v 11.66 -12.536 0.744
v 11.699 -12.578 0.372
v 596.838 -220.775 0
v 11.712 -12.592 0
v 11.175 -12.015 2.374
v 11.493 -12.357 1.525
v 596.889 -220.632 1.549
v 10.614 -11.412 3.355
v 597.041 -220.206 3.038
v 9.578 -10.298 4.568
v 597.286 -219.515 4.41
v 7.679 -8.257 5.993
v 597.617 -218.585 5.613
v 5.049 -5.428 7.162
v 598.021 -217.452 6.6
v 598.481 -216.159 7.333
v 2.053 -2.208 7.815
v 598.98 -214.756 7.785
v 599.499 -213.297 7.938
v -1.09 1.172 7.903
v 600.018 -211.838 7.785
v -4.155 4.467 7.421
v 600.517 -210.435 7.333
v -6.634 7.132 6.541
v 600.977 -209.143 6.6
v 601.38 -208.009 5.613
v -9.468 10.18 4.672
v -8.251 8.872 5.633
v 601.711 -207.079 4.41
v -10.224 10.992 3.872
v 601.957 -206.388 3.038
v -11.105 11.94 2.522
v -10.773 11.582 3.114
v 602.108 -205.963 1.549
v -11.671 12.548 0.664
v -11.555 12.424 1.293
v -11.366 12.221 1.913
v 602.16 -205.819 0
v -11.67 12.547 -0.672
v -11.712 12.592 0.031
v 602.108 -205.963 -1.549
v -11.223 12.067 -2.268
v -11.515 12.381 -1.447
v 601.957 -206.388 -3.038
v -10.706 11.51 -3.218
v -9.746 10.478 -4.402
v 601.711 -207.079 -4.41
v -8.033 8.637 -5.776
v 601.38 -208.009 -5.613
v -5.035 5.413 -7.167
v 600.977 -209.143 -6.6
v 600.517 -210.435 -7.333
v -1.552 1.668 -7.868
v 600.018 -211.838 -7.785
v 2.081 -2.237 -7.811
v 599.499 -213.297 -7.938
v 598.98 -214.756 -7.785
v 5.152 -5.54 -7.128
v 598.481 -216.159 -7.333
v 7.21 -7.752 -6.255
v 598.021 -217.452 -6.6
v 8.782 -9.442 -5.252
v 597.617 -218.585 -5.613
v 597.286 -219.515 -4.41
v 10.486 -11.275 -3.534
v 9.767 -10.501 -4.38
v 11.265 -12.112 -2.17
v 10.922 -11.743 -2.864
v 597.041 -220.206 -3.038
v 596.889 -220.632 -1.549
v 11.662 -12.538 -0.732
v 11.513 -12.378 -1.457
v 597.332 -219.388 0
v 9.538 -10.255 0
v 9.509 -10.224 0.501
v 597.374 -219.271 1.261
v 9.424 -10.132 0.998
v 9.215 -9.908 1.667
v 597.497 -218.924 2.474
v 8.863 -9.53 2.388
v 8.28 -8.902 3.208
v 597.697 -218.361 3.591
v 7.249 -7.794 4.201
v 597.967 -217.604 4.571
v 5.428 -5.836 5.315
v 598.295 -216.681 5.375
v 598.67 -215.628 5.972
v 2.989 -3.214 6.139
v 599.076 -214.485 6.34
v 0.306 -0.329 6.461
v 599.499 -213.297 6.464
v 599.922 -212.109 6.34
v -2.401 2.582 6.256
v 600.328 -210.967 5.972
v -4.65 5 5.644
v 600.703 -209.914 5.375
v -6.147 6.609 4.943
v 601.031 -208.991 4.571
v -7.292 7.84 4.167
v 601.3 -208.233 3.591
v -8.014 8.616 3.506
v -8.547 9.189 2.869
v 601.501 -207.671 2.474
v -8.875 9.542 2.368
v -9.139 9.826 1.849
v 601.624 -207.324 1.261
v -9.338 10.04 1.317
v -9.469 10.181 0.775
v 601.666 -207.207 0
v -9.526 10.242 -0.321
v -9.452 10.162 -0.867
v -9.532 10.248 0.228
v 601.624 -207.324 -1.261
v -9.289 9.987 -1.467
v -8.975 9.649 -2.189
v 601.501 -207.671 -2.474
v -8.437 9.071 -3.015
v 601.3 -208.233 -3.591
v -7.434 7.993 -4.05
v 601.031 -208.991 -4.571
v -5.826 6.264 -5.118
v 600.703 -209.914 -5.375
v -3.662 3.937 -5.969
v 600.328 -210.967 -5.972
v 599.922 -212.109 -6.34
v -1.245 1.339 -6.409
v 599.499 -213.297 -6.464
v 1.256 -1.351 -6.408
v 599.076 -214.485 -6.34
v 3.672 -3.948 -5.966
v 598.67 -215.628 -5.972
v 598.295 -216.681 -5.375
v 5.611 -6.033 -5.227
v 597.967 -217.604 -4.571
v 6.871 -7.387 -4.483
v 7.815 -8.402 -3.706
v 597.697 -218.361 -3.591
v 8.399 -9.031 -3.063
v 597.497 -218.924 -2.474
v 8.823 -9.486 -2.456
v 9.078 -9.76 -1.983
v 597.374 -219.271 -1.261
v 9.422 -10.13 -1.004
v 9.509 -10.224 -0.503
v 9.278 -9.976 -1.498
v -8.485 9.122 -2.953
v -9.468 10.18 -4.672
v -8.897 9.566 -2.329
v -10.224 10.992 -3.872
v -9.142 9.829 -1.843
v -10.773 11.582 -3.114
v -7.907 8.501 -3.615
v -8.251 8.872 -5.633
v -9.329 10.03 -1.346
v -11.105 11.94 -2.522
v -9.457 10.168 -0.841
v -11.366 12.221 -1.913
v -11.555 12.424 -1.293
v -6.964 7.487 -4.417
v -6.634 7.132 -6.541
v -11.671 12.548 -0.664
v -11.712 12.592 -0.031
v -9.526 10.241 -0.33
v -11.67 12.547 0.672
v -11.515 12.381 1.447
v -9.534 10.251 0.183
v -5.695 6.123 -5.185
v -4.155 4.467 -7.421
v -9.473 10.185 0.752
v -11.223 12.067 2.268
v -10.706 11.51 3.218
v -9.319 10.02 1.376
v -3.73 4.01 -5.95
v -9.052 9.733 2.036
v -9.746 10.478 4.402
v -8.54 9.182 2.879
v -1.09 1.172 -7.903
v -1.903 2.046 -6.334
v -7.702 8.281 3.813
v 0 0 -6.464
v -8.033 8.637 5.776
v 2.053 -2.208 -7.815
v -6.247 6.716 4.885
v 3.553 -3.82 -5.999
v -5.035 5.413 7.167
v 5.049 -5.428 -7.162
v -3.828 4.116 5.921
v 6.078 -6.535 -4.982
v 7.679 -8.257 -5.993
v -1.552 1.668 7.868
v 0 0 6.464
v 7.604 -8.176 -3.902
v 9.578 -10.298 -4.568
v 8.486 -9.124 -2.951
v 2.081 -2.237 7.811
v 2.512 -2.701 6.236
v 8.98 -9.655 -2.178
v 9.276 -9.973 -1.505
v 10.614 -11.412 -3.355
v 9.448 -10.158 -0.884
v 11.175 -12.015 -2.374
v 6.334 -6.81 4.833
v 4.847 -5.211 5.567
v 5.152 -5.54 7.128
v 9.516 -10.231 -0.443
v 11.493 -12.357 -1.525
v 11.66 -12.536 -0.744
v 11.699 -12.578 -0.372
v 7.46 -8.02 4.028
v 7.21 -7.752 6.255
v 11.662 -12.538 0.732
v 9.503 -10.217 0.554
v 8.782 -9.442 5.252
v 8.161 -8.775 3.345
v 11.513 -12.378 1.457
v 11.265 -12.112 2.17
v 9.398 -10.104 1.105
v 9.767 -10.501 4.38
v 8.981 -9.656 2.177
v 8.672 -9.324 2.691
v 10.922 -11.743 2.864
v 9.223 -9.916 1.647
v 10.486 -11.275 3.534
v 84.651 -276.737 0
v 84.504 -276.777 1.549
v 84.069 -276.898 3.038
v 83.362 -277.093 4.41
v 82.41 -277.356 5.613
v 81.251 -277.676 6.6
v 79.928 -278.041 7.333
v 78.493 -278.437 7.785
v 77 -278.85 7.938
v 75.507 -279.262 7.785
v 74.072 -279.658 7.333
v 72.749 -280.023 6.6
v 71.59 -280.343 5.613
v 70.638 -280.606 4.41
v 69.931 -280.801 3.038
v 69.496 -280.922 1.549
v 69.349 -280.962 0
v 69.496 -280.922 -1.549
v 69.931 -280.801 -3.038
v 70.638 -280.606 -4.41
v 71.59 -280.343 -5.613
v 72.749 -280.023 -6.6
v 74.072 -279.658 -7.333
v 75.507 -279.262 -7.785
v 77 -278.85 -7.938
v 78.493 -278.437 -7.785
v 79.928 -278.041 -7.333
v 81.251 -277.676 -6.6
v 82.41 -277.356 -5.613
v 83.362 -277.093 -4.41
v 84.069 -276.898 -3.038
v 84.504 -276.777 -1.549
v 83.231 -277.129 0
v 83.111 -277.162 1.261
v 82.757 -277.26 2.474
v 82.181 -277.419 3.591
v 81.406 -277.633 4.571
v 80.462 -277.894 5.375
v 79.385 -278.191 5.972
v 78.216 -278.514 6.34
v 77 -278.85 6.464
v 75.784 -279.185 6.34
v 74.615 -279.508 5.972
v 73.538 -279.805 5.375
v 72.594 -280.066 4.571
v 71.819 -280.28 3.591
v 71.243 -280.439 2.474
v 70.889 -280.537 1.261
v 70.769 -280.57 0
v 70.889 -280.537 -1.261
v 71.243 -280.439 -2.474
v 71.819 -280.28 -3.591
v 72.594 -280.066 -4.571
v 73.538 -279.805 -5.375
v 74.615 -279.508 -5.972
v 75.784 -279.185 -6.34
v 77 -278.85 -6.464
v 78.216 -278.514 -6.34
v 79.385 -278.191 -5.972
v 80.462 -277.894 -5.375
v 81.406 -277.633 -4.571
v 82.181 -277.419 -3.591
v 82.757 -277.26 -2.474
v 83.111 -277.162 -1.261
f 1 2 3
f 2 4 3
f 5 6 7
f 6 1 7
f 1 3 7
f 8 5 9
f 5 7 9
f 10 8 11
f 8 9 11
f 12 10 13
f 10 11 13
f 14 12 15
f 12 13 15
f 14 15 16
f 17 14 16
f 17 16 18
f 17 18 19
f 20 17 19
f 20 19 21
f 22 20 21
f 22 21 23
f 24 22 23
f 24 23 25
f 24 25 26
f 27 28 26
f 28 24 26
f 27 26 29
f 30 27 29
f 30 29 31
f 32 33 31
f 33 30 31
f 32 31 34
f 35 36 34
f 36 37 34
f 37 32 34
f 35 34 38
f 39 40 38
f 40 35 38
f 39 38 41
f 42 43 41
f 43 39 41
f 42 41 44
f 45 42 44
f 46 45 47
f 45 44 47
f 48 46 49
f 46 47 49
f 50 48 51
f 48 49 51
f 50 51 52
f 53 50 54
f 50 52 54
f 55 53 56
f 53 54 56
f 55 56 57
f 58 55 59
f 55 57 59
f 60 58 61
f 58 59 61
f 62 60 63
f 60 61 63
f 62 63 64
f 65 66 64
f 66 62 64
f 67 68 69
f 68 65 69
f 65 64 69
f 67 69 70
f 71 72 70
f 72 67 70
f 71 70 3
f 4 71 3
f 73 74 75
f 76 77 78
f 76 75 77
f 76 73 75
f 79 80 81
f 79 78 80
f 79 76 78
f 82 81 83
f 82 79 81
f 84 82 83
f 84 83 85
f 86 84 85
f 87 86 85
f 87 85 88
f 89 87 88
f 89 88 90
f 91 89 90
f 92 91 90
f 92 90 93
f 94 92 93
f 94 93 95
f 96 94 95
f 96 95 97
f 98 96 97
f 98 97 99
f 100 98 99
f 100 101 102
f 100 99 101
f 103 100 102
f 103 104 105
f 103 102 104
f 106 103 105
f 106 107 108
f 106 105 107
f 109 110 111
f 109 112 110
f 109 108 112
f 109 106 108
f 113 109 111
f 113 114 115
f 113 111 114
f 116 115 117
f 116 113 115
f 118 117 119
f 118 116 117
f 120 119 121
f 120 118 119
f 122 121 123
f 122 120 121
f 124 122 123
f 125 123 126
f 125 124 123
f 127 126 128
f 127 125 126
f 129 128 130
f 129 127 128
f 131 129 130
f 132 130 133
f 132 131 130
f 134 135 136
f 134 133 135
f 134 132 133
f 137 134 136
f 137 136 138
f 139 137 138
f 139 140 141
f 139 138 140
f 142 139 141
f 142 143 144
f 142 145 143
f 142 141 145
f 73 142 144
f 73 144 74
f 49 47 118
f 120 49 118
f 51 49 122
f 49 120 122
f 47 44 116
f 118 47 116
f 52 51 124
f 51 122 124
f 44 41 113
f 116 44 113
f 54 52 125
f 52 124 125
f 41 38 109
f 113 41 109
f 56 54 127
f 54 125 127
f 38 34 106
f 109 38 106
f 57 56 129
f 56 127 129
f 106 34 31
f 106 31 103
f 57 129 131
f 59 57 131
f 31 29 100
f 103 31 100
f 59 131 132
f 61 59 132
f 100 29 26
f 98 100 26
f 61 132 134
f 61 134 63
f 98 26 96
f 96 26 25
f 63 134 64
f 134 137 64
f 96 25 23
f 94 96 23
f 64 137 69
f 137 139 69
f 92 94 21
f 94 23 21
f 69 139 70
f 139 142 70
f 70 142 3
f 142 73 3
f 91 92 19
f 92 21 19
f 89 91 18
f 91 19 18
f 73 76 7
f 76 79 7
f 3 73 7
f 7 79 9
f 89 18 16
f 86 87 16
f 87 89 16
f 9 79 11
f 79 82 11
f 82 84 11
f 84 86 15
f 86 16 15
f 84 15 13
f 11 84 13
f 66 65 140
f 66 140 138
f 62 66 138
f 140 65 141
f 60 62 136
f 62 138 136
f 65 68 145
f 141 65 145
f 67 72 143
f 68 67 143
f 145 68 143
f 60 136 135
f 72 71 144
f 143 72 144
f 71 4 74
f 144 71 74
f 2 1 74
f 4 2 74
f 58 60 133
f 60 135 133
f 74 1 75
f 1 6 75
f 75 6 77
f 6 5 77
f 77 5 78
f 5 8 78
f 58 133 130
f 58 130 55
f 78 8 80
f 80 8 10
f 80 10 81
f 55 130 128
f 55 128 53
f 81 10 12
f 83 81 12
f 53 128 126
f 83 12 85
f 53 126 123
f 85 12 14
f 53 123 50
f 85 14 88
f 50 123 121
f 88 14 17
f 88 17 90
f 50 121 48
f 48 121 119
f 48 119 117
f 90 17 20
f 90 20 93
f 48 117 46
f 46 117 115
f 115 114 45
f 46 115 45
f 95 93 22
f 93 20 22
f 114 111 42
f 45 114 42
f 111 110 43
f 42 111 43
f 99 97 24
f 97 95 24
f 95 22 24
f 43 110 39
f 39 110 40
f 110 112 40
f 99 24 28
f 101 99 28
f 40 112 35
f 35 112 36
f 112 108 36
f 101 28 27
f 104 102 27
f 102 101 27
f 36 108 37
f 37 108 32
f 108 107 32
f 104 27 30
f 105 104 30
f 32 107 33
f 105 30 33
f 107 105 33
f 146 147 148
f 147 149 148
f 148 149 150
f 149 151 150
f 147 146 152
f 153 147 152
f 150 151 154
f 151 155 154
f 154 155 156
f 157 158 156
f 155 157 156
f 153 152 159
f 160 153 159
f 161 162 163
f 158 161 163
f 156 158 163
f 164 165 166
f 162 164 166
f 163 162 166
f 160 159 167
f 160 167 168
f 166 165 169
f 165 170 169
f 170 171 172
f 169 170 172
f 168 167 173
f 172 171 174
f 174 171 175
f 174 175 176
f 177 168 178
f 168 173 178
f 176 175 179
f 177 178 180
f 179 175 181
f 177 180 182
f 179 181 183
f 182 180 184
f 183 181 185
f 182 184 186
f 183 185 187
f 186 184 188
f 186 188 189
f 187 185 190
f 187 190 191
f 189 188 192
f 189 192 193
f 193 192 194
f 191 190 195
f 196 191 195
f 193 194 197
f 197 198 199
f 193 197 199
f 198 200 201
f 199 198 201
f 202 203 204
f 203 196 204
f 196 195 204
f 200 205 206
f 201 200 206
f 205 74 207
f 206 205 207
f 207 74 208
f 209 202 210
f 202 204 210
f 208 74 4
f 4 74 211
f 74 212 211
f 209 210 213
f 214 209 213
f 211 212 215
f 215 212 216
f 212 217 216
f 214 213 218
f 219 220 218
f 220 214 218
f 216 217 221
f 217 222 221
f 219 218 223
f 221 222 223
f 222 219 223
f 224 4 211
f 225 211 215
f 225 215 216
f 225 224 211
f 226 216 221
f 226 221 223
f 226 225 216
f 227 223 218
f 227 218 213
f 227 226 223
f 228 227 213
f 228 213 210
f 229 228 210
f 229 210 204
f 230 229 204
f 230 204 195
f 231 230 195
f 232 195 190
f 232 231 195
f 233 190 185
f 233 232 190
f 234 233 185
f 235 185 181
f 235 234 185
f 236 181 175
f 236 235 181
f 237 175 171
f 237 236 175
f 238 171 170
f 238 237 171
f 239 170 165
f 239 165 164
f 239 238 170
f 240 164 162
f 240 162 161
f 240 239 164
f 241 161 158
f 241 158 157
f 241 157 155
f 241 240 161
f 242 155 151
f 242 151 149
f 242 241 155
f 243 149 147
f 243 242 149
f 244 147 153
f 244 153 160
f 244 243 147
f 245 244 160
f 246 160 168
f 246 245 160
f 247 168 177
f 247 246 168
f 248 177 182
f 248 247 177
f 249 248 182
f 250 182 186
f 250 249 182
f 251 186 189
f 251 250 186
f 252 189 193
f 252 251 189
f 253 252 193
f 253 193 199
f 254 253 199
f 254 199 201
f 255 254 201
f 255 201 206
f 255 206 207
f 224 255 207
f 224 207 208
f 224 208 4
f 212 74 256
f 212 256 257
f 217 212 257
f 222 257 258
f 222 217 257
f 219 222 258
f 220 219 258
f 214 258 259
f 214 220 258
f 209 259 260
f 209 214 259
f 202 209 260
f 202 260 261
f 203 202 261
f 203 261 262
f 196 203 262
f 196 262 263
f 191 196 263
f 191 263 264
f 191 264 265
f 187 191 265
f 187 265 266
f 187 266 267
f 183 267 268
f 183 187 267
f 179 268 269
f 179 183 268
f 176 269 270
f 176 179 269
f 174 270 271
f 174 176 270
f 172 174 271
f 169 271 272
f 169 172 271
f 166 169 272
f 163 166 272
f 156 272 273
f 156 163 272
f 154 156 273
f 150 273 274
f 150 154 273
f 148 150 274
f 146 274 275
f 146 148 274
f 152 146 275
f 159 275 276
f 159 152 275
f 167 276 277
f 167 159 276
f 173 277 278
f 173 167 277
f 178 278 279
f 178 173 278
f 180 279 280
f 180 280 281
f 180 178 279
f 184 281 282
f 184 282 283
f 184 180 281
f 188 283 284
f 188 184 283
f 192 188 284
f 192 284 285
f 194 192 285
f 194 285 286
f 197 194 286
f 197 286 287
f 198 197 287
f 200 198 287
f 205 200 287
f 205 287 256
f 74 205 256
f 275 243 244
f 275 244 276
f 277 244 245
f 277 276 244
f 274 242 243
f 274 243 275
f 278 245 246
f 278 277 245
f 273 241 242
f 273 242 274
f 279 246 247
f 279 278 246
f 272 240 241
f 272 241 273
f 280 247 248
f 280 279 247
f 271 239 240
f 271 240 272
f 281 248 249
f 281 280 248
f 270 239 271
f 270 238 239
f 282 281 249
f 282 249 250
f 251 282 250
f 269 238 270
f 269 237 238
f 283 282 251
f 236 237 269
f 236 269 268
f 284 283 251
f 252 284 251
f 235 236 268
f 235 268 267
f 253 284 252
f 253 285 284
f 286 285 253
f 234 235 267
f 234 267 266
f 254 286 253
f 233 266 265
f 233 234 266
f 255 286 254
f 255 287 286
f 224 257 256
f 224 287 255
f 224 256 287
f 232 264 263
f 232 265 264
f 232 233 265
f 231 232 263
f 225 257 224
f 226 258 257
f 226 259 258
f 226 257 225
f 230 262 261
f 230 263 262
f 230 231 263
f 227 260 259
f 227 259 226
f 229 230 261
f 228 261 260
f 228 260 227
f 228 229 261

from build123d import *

# Parameters (mm, degrees)
SKETCH11_ON_SEGMENT_1_R         = 7.9375
SKETCH11_ON_SEGMENT_1_R_2       = 6.4643
STRUCTURAL_MEMBER1_DEPTH        = 658.886900495
SKETCH11_R                      = 7.9375
SKETCH11_R_2                    = 6.4643
STRUCTURAL_MEMBER1_2_DEPTH      = 289.285409962
STRUCTURAL_MEMBER1_2_DEPTH_BACK = 22.573683103


with BuildPart() as part:
    # Sketch11 on segment 1 (carried to segment 1) → Structural Member1 (new body)
    with BuildSketch(Plane(origin=(599.498795794, -213.29722096, 0), x_dir=(-0.335207906, -0.942144182, 0), z_dir=(-0.942144182, 0.335207906, 0))):
        Circle(SKETCH11_ON_SEGMENT_1_R)
        Circle(SKETCH11_ON_SEGMENT_1_R_2, mode=Mode.SUBTRACT)
    extrude(amount=STRUCTURAL_MEMBER1_DEPTH)

    # Structural Member1 mitre 1
    split(bisect_by=Plane(origin=(0, 0, 0), x_dir=(-0.68104996, 0.732236951, 0), z_dir=(0.732236951, 0.68104996, 0)), keep=Keep.TOP)


with BuildPart() as body_2:
    # Sketch11 → Structural Member1 2 (new, two sides)
    with BuildSketch(Plane(origin=(0, 0, 0), x_dir=(0.9639252411090171, 0.2661731195160835, 0), z_dir=(0.2661731195160835, -0.9639252411090171, 0))) as structural_member1_2_sk:
        Circle(SKETCH11_R)
        Circle(SKETCH11_R_2, mode=Mode.SUBTRACT)
    extrude(amount=STRUCTURAL_MEMBER1_2_DEPTH)
    extrude(structural_member1_2_sk.sketch, amount=-STRUCTURAL_MEMBER1_2_DEPTH_BACK)

    # Structural Member1 2 mitre 1
    split(bisect_by=Plane(origin=(0, 0, 0), x_dir=(0.68104996, -0.732236951, 0), z_dir=(-0.732236951, -0.68104996, 0)), keep=Keep.TOP)


solid = Compound([part.part, body_2.part])
